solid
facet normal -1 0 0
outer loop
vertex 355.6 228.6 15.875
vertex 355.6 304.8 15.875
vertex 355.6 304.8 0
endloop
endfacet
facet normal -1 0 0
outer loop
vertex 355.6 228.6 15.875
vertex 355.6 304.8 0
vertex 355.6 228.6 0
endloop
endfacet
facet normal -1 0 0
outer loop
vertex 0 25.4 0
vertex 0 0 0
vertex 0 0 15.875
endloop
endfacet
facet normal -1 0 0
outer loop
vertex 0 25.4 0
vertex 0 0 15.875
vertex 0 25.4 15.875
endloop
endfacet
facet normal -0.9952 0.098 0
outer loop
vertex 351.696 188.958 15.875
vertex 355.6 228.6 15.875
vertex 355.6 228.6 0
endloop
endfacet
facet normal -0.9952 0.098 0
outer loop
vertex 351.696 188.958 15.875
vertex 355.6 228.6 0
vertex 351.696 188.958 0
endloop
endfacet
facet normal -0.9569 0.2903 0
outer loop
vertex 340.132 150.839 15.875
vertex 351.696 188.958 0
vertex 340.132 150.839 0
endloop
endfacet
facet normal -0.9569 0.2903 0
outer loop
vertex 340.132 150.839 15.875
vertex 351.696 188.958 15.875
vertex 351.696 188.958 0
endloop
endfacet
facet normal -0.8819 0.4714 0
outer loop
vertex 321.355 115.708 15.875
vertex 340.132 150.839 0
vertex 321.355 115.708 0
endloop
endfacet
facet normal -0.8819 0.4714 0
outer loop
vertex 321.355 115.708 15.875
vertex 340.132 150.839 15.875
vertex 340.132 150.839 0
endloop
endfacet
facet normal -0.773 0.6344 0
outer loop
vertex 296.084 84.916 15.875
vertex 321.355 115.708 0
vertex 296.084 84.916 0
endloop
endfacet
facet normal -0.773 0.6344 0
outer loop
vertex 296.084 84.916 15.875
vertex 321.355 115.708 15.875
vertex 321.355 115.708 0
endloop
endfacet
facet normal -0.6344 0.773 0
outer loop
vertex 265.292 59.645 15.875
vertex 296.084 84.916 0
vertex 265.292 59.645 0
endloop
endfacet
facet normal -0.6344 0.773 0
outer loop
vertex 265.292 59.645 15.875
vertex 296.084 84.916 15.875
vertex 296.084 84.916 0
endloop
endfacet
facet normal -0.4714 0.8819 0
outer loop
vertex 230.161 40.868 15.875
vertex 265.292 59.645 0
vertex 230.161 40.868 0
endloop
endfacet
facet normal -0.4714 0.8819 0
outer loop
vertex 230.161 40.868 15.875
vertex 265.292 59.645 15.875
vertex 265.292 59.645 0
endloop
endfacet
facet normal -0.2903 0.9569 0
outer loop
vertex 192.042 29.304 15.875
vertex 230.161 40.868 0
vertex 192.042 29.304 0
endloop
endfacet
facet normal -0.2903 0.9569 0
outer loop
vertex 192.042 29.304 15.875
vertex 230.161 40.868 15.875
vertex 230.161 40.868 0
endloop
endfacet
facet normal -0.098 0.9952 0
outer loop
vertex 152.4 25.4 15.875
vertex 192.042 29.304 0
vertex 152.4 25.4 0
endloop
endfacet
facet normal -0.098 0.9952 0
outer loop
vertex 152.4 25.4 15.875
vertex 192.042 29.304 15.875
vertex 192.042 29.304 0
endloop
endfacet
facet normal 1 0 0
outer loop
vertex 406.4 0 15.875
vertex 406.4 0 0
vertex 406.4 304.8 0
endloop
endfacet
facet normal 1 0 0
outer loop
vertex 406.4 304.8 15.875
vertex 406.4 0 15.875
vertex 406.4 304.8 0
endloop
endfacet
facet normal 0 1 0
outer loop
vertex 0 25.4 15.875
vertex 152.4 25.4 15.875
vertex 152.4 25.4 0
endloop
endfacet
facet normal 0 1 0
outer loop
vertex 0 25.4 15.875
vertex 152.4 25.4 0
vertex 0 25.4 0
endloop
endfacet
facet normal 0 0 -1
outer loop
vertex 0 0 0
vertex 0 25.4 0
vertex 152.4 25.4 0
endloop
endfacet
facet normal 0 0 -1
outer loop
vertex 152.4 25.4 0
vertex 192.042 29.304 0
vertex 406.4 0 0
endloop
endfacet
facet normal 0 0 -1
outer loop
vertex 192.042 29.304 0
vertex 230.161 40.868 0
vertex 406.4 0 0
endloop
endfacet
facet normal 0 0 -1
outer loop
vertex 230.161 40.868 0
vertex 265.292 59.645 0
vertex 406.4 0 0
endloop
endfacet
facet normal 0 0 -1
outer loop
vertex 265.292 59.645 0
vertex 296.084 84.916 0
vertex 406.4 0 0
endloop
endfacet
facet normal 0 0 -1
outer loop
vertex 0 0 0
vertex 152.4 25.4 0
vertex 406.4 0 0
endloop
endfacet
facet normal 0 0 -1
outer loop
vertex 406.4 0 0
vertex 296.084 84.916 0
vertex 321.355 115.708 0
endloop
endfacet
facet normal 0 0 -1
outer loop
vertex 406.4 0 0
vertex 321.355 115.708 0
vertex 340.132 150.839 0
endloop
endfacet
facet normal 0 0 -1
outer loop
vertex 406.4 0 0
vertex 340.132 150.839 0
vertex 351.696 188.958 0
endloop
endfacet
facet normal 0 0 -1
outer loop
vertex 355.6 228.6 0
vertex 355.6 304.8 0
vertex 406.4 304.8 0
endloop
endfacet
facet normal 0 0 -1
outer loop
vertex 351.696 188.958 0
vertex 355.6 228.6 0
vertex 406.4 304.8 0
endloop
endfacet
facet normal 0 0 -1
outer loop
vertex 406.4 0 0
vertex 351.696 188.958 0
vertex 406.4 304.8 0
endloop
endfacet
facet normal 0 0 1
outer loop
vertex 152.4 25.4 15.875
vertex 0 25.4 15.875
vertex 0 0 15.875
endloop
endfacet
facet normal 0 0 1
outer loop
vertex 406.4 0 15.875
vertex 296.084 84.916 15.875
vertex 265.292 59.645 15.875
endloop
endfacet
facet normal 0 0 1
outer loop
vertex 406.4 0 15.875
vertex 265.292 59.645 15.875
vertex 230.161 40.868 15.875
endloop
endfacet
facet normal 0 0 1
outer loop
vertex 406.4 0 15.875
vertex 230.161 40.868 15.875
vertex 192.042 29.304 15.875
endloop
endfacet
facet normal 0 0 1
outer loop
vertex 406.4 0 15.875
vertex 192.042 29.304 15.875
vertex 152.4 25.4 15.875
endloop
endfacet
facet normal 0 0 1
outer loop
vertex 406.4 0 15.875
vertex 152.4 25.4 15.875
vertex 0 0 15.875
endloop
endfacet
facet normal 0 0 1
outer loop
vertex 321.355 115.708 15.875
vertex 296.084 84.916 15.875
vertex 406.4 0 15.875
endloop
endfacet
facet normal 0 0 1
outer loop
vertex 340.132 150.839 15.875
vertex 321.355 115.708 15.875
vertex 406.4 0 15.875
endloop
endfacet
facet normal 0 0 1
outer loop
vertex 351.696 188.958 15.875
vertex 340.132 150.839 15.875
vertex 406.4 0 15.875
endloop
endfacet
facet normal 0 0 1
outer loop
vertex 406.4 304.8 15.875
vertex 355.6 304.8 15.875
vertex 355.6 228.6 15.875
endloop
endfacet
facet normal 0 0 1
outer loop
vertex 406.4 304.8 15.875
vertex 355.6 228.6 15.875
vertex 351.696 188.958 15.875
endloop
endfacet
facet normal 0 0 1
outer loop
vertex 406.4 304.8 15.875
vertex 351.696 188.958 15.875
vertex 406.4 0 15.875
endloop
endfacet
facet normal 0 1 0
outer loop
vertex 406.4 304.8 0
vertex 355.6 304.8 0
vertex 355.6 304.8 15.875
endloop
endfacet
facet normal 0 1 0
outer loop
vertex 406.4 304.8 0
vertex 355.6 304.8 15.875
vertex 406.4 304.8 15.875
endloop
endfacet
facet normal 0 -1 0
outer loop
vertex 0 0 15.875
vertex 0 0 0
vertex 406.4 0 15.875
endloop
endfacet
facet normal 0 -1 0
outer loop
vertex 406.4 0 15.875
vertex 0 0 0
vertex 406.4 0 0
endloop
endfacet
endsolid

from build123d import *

# Parameters (mm, degrees)
SKETCH1_W           = 406.4
SKETCH1_H           = 304.8
BOSS_EXTRUDE1_DEPTH = 15.875
SKETCH2_R           = 9.525
CUT_EXTRUDE1_DEPTH  = 16.875
CUT_EXTRUDE2_DEPTH  = 16.875


with BuildPart() as part:
    # Sketch1 → Boss-Extrude1 (new body)
    with BuildSketch(Plane.XY):
        with Locations((203.2, 152.4)):
            Rectangle(SKETCH1_W, SKETCH1_H)
    extrude(amount=BOSS_EXTRUDE1_DEPTH)

    # Sketch2 → Cut-Extrude1 (cut, through all)
    with BuildSketch(Plane.XY.offset(15.875)):
        with Locations((152.4, 228.6)):
            Circle(SKETCH2_R)
    extrude(amount=-CUT_EXTRUDE1_DEPTH, mode=Mode.SUBTRACT)

    # Sketch3 → Cut-Extrude2 (cut, through all)
    with BuildSketch(Plane.XY.offset(15.875)):
        with BuildLine():
            Line((152.4, 25.4), (0, 25.4))
            Line((0, 25.4), (0, 304.8))
            Line((0, 304.8), (355.6, 304.8))
            Line((355.6, 304.8), (355.6, 228.6))
            ThreePointArc((355.6, 228.6), (296.084097937, 84.915902063), (152.4, 25.4))
        make_face()
    extrude(amount=-CUT_EXTRUDE2_DEPTH, mode=Mode.SUBTRACT)


solid = part.part
